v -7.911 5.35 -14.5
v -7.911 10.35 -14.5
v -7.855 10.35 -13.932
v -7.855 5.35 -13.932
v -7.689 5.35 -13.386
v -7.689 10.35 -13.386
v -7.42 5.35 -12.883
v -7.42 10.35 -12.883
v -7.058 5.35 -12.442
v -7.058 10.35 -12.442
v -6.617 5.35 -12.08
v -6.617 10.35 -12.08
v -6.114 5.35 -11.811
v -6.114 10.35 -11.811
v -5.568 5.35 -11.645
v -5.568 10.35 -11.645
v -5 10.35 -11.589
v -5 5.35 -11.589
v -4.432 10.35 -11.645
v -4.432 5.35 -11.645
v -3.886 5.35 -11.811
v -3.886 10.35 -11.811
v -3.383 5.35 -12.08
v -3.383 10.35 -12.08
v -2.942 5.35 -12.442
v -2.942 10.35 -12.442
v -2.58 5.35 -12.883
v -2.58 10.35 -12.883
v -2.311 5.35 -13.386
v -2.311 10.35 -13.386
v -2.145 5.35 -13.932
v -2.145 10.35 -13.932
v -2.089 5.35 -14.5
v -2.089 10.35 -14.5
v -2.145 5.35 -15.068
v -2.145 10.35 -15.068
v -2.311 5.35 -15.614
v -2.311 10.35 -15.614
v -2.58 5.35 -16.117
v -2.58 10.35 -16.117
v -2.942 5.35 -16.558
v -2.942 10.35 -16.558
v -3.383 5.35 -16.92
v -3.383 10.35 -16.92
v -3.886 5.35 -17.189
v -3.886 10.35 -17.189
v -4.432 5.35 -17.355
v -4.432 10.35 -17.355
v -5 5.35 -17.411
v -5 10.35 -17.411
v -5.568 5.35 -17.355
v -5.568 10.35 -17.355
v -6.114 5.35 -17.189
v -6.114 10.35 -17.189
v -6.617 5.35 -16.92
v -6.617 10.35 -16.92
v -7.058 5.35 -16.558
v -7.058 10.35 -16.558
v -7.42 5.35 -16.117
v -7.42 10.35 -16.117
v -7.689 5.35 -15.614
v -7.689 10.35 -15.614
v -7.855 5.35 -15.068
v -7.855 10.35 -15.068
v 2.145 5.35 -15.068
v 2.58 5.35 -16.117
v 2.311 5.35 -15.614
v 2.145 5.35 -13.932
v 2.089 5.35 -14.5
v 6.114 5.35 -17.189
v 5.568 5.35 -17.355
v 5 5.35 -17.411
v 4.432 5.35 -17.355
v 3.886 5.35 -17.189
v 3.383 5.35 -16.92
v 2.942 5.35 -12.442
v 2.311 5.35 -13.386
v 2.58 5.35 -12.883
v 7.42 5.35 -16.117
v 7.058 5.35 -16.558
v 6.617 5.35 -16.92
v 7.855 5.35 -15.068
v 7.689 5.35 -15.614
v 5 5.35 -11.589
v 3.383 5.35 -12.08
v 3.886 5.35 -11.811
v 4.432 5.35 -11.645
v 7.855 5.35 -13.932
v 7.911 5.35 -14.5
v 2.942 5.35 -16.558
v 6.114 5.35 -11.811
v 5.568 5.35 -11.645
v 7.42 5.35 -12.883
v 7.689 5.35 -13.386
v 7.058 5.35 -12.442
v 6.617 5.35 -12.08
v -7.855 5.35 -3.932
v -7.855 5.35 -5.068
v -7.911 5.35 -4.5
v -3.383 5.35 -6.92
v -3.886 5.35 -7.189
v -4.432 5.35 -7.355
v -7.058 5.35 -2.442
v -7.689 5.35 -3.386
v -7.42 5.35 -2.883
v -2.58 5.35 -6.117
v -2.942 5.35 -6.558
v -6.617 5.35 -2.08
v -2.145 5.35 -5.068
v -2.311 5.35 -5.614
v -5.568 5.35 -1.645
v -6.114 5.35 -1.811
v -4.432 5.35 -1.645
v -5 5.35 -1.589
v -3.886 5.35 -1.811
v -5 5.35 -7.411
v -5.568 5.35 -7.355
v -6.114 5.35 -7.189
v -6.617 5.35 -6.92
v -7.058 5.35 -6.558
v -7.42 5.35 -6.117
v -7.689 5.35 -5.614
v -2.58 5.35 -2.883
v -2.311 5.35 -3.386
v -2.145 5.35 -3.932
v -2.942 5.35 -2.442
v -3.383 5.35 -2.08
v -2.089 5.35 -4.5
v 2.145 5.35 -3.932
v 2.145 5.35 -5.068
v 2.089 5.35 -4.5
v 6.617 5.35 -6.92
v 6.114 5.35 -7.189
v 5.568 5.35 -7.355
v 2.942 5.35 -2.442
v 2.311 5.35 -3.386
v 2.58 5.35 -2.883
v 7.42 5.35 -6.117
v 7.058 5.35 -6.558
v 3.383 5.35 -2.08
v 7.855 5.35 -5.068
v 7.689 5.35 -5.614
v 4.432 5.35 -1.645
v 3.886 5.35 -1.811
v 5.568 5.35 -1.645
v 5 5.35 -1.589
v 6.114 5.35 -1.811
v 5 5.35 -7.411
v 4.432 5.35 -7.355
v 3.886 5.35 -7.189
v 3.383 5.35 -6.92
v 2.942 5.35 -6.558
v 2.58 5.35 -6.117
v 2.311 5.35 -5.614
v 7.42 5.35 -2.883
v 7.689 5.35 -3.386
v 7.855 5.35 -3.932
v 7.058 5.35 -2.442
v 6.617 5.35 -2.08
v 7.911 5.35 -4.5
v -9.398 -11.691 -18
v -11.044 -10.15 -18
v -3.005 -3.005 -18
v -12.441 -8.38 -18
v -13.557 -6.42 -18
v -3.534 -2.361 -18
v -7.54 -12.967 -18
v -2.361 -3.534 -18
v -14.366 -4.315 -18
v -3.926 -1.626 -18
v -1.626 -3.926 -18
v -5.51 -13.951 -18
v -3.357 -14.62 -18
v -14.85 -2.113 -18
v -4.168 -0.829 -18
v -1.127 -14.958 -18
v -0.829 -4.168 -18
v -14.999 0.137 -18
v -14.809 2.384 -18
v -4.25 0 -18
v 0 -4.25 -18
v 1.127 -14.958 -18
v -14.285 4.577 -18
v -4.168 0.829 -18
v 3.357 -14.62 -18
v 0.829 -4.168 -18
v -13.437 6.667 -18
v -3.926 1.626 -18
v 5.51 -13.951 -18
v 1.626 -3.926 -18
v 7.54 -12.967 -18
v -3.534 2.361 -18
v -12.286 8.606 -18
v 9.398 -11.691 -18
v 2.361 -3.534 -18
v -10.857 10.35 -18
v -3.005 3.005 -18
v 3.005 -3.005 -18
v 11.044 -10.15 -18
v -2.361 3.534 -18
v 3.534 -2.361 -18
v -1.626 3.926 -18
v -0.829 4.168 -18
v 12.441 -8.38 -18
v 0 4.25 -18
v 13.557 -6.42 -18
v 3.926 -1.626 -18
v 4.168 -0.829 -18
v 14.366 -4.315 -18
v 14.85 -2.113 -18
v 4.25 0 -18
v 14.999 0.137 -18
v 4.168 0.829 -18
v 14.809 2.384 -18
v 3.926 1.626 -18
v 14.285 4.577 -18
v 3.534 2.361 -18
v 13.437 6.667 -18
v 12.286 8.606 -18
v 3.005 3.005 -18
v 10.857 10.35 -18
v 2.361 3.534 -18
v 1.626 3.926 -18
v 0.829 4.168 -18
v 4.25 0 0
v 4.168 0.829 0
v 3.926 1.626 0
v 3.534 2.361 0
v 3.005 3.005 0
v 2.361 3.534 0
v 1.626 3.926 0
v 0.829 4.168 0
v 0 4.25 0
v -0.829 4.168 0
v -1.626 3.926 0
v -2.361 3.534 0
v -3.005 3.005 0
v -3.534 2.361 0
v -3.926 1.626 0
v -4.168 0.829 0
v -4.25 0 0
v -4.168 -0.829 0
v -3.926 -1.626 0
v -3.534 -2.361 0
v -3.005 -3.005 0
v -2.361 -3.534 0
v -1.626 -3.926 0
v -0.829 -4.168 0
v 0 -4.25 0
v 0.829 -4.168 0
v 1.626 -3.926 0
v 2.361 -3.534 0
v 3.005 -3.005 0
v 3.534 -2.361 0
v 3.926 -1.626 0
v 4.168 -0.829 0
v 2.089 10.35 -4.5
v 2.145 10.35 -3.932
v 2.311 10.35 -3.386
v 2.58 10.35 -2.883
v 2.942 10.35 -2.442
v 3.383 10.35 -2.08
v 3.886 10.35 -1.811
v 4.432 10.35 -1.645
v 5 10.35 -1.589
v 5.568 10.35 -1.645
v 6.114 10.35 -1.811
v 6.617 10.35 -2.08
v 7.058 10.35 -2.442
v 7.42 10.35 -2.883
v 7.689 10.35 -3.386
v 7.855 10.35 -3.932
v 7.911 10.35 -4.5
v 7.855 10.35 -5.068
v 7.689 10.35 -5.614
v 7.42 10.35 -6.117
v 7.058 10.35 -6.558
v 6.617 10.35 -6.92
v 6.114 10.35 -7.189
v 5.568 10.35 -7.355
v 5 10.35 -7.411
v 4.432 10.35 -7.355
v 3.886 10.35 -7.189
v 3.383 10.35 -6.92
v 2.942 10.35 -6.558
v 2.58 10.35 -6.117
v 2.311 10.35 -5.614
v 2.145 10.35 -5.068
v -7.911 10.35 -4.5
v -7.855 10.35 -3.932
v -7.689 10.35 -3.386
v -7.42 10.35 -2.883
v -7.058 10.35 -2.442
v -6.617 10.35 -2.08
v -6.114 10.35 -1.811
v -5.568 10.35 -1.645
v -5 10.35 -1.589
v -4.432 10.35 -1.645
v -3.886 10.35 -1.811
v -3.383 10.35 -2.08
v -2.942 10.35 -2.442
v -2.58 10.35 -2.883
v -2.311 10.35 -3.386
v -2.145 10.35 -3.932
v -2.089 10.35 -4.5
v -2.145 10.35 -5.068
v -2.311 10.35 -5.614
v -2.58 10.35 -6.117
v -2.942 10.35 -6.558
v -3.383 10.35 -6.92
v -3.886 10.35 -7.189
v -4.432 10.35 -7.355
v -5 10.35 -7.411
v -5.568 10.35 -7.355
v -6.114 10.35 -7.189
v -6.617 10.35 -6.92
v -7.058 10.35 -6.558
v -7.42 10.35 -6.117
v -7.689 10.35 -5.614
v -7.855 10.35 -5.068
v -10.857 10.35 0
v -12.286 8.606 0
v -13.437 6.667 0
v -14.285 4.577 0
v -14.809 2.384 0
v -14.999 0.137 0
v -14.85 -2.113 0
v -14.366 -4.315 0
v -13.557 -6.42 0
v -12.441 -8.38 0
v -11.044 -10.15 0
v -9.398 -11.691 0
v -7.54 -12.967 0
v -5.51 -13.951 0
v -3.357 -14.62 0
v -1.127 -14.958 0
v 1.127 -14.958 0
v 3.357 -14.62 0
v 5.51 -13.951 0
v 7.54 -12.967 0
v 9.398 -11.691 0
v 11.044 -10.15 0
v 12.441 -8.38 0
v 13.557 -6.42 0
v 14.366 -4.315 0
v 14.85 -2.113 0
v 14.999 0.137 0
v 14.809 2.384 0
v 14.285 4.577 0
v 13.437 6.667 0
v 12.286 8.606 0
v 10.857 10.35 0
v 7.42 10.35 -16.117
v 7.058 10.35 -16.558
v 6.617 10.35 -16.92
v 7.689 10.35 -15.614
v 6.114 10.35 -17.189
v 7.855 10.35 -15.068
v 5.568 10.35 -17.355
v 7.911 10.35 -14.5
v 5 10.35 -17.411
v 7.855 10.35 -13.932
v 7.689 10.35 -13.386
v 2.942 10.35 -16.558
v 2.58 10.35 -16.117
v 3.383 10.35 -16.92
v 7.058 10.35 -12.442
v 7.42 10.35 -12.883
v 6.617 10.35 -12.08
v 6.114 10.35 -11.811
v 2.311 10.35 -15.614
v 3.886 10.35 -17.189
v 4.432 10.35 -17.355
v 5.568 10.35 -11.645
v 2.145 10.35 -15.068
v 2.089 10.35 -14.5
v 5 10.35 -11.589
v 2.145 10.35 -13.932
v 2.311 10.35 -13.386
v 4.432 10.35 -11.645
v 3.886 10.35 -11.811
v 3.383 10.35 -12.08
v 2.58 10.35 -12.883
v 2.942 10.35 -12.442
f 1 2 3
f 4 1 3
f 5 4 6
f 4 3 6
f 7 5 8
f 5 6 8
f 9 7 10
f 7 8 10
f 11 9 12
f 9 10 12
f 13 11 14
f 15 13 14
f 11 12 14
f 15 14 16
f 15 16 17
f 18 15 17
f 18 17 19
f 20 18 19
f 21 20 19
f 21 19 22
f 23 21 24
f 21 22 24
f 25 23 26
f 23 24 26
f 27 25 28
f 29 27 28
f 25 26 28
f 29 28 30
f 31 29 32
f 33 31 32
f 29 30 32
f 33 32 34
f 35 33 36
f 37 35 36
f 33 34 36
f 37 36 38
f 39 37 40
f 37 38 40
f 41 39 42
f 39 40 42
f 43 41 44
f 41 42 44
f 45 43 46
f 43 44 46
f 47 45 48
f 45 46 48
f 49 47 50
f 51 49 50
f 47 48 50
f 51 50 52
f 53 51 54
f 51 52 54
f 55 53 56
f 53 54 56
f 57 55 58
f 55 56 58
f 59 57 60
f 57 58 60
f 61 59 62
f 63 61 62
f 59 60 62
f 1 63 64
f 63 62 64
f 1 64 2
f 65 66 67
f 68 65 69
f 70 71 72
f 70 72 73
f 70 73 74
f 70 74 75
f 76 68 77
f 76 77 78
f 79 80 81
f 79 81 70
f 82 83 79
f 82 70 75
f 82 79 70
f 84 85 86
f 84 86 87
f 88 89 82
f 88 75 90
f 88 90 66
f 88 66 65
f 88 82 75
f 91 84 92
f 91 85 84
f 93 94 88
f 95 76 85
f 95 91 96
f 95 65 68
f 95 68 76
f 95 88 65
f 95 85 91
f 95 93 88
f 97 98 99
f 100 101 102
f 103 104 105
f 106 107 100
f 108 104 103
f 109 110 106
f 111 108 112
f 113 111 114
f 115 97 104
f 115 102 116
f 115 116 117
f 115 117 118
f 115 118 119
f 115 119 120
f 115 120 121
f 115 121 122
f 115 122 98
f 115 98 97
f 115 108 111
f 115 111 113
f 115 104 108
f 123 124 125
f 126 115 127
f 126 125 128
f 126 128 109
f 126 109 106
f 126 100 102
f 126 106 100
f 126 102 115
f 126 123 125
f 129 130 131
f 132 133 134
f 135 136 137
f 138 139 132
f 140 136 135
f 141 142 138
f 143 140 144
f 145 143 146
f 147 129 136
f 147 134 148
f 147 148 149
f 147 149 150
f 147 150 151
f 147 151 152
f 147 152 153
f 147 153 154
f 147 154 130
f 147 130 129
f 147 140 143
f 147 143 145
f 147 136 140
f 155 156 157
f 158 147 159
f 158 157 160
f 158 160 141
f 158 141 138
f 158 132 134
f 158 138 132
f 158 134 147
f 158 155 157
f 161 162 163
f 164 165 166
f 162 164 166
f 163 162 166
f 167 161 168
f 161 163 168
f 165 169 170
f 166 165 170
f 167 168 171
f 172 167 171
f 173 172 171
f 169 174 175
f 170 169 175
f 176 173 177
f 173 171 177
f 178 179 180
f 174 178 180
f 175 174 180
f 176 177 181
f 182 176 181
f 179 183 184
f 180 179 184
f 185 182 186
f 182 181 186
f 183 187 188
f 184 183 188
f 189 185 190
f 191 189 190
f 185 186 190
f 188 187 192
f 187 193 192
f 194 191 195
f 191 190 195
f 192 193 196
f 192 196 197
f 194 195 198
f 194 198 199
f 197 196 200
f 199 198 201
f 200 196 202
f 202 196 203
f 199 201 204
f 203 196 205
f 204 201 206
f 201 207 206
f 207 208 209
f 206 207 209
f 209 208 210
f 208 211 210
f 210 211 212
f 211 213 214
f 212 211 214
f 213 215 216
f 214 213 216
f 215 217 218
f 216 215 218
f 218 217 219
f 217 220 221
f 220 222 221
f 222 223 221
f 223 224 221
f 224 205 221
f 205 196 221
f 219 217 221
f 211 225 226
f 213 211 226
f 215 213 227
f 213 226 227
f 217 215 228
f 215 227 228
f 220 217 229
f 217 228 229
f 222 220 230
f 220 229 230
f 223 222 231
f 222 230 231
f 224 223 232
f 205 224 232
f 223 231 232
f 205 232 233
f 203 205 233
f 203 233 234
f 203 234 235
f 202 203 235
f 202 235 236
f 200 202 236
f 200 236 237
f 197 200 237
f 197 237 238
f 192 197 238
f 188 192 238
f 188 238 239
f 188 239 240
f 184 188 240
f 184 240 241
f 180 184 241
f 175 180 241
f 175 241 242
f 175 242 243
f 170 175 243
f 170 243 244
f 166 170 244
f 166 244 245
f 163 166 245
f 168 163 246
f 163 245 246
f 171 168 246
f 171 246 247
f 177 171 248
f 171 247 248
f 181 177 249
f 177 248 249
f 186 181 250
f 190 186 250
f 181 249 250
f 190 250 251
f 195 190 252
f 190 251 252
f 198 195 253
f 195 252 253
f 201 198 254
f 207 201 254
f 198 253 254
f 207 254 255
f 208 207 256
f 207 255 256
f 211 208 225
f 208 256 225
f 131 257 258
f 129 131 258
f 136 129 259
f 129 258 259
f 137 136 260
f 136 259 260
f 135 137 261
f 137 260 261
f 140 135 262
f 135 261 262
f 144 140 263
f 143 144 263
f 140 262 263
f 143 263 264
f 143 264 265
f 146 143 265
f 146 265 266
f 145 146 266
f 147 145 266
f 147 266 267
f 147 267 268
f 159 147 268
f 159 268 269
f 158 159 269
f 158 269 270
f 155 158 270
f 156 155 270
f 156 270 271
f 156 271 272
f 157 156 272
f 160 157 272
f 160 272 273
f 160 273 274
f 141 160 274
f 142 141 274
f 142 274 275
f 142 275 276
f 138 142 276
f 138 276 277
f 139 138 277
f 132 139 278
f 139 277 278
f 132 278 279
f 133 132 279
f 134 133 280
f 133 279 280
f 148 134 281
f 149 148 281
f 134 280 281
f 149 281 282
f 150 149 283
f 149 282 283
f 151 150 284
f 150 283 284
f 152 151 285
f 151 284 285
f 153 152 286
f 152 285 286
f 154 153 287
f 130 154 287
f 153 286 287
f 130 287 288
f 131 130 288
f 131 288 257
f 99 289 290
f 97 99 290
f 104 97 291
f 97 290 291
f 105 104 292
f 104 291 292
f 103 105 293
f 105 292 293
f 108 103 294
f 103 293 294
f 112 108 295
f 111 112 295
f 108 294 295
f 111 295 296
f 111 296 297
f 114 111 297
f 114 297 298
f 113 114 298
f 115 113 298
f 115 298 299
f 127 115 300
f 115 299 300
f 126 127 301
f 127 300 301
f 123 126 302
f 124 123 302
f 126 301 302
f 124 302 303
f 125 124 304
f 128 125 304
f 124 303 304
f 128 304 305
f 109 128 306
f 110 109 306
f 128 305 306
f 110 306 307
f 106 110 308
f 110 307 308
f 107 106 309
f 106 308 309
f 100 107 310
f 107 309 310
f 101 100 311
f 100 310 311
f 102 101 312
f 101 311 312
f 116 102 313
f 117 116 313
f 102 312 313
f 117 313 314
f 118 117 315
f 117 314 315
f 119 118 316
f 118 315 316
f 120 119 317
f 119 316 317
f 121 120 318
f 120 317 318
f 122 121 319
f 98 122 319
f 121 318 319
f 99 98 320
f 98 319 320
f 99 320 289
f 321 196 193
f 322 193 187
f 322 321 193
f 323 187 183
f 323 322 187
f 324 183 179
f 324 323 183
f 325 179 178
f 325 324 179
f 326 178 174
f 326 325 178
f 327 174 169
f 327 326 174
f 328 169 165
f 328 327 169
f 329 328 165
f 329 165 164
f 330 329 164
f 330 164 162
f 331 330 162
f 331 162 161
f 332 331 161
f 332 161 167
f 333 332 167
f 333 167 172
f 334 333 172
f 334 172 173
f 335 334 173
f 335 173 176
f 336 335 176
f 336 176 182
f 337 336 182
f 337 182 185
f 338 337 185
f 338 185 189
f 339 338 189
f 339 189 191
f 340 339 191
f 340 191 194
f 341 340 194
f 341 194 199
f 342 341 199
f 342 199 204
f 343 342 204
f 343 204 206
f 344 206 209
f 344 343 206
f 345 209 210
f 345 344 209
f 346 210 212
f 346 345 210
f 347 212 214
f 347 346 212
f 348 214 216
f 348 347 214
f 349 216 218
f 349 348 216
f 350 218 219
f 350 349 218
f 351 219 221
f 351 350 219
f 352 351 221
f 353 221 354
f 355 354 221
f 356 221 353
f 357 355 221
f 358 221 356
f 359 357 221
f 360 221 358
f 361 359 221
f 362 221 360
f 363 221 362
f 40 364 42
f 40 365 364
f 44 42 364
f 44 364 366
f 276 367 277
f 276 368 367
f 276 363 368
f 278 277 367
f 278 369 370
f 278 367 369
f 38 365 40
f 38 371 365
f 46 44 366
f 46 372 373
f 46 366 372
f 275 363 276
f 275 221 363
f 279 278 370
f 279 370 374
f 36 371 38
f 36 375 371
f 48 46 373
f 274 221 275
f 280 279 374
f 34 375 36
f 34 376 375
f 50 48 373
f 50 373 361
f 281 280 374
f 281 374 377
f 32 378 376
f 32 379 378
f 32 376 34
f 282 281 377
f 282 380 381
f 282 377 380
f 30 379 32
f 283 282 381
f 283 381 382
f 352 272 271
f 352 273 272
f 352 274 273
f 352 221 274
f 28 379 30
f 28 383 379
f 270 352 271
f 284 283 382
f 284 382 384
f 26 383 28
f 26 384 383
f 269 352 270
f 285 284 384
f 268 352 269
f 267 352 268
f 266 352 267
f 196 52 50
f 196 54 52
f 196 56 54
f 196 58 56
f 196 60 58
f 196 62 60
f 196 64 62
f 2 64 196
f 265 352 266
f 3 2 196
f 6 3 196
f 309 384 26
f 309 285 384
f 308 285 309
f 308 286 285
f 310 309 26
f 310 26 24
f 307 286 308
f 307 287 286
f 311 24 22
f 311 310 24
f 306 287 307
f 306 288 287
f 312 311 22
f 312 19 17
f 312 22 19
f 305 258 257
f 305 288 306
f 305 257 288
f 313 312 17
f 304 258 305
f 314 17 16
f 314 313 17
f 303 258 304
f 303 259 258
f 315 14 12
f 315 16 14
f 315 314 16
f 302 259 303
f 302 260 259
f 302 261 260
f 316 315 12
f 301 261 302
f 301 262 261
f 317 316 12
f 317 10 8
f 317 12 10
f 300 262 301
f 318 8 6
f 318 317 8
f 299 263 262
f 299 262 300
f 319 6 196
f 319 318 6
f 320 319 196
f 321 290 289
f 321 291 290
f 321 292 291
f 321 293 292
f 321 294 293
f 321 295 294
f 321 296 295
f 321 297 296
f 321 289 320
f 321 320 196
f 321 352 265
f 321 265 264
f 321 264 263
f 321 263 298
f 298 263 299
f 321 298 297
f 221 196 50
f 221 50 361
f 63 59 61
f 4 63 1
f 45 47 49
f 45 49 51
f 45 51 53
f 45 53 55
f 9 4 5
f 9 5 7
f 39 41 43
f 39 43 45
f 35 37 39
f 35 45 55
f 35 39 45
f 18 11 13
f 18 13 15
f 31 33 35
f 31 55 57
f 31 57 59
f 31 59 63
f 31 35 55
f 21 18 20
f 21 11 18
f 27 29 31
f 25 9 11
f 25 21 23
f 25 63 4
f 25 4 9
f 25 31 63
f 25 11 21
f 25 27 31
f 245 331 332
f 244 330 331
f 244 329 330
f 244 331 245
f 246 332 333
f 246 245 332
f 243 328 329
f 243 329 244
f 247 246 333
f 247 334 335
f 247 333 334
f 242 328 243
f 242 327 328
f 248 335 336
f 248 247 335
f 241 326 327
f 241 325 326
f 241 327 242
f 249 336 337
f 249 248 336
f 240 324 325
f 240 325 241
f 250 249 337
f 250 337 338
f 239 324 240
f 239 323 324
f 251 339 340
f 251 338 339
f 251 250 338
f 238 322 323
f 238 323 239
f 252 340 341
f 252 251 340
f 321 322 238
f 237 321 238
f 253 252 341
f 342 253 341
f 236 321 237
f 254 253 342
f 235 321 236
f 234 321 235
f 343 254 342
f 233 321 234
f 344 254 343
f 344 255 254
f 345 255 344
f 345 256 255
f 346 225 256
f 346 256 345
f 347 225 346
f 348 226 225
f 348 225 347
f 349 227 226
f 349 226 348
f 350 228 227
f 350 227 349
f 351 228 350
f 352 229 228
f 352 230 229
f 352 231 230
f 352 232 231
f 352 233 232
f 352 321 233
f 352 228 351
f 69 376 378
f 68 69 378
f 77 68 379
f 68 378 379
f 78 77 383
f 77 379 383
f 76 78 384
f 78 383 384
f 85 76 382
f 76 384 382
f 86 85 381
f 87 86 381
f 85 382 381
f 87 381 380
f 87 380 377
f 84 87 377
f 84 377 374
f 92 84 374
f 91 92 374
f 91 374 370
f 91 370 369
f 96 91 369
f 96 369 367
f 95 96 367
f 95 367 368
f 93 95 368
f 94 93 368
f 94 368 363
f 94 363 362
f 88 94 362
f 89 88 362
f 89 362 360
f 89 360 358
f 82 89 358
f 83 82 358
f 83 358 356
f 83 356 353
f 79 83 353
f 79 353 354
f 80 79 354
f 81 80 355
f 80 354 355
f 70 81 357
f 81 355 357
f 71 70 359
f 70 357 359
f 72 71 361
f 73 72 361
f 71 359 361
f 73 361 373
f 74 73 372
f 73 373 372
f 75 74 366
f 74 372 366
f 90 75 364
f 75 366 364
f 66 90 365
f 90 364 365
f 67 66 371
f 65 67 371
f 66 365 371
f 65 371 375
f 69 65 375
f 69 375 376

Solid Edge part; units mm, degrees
sketch "Sketch1" plane through (0, 0, 0) normal (0, 0, 1) x (1, 0, 0)
  circle A0 centre (0, 0) radius 15
  circle A1 centre (0, 0) radius 4.25
  dimension "D1" = 30
  dimension "D2" = 8.5
extrude "ExtrudedProtrusion_1" add sketch "Sketch1" against normal blind 18
sketch "Sketch2" plane through (0, 0, 0) normal (0, 0, 1) x (0, 1, 0)
  line L0 (10.35, -10.8571) -> (10.35, 10.8571)
  arc A0 (10.35, 10.8571) -> (10.35, -10.8571) centre (0, 0) cw
extrude "ExtrudedCutout_1" cut sketch "Sketch2" against normal blind 18
sketch "Sketch3" plane through (0, 10.35, -9) normal (0, 1, 0) x (-1, 0, 0)
  circle A0 centre (-5, 4.5) radius 2.9108
  circle A1 centre (5, 4.5) radius 2.9108
  circle A2 centre (-5, -5.5) radius 2.9108
  circle A3 centre (5, -5.5) radius 2.9108
  dimension "D1" = 10
  dimension "D2" = 10
  dimension "D3" = 5
  dimension "D4" = 4.5
extrude "ExtrudedCutout_2" cut sketch "Sketch3" against normal blind 5
properties material "ABS"
